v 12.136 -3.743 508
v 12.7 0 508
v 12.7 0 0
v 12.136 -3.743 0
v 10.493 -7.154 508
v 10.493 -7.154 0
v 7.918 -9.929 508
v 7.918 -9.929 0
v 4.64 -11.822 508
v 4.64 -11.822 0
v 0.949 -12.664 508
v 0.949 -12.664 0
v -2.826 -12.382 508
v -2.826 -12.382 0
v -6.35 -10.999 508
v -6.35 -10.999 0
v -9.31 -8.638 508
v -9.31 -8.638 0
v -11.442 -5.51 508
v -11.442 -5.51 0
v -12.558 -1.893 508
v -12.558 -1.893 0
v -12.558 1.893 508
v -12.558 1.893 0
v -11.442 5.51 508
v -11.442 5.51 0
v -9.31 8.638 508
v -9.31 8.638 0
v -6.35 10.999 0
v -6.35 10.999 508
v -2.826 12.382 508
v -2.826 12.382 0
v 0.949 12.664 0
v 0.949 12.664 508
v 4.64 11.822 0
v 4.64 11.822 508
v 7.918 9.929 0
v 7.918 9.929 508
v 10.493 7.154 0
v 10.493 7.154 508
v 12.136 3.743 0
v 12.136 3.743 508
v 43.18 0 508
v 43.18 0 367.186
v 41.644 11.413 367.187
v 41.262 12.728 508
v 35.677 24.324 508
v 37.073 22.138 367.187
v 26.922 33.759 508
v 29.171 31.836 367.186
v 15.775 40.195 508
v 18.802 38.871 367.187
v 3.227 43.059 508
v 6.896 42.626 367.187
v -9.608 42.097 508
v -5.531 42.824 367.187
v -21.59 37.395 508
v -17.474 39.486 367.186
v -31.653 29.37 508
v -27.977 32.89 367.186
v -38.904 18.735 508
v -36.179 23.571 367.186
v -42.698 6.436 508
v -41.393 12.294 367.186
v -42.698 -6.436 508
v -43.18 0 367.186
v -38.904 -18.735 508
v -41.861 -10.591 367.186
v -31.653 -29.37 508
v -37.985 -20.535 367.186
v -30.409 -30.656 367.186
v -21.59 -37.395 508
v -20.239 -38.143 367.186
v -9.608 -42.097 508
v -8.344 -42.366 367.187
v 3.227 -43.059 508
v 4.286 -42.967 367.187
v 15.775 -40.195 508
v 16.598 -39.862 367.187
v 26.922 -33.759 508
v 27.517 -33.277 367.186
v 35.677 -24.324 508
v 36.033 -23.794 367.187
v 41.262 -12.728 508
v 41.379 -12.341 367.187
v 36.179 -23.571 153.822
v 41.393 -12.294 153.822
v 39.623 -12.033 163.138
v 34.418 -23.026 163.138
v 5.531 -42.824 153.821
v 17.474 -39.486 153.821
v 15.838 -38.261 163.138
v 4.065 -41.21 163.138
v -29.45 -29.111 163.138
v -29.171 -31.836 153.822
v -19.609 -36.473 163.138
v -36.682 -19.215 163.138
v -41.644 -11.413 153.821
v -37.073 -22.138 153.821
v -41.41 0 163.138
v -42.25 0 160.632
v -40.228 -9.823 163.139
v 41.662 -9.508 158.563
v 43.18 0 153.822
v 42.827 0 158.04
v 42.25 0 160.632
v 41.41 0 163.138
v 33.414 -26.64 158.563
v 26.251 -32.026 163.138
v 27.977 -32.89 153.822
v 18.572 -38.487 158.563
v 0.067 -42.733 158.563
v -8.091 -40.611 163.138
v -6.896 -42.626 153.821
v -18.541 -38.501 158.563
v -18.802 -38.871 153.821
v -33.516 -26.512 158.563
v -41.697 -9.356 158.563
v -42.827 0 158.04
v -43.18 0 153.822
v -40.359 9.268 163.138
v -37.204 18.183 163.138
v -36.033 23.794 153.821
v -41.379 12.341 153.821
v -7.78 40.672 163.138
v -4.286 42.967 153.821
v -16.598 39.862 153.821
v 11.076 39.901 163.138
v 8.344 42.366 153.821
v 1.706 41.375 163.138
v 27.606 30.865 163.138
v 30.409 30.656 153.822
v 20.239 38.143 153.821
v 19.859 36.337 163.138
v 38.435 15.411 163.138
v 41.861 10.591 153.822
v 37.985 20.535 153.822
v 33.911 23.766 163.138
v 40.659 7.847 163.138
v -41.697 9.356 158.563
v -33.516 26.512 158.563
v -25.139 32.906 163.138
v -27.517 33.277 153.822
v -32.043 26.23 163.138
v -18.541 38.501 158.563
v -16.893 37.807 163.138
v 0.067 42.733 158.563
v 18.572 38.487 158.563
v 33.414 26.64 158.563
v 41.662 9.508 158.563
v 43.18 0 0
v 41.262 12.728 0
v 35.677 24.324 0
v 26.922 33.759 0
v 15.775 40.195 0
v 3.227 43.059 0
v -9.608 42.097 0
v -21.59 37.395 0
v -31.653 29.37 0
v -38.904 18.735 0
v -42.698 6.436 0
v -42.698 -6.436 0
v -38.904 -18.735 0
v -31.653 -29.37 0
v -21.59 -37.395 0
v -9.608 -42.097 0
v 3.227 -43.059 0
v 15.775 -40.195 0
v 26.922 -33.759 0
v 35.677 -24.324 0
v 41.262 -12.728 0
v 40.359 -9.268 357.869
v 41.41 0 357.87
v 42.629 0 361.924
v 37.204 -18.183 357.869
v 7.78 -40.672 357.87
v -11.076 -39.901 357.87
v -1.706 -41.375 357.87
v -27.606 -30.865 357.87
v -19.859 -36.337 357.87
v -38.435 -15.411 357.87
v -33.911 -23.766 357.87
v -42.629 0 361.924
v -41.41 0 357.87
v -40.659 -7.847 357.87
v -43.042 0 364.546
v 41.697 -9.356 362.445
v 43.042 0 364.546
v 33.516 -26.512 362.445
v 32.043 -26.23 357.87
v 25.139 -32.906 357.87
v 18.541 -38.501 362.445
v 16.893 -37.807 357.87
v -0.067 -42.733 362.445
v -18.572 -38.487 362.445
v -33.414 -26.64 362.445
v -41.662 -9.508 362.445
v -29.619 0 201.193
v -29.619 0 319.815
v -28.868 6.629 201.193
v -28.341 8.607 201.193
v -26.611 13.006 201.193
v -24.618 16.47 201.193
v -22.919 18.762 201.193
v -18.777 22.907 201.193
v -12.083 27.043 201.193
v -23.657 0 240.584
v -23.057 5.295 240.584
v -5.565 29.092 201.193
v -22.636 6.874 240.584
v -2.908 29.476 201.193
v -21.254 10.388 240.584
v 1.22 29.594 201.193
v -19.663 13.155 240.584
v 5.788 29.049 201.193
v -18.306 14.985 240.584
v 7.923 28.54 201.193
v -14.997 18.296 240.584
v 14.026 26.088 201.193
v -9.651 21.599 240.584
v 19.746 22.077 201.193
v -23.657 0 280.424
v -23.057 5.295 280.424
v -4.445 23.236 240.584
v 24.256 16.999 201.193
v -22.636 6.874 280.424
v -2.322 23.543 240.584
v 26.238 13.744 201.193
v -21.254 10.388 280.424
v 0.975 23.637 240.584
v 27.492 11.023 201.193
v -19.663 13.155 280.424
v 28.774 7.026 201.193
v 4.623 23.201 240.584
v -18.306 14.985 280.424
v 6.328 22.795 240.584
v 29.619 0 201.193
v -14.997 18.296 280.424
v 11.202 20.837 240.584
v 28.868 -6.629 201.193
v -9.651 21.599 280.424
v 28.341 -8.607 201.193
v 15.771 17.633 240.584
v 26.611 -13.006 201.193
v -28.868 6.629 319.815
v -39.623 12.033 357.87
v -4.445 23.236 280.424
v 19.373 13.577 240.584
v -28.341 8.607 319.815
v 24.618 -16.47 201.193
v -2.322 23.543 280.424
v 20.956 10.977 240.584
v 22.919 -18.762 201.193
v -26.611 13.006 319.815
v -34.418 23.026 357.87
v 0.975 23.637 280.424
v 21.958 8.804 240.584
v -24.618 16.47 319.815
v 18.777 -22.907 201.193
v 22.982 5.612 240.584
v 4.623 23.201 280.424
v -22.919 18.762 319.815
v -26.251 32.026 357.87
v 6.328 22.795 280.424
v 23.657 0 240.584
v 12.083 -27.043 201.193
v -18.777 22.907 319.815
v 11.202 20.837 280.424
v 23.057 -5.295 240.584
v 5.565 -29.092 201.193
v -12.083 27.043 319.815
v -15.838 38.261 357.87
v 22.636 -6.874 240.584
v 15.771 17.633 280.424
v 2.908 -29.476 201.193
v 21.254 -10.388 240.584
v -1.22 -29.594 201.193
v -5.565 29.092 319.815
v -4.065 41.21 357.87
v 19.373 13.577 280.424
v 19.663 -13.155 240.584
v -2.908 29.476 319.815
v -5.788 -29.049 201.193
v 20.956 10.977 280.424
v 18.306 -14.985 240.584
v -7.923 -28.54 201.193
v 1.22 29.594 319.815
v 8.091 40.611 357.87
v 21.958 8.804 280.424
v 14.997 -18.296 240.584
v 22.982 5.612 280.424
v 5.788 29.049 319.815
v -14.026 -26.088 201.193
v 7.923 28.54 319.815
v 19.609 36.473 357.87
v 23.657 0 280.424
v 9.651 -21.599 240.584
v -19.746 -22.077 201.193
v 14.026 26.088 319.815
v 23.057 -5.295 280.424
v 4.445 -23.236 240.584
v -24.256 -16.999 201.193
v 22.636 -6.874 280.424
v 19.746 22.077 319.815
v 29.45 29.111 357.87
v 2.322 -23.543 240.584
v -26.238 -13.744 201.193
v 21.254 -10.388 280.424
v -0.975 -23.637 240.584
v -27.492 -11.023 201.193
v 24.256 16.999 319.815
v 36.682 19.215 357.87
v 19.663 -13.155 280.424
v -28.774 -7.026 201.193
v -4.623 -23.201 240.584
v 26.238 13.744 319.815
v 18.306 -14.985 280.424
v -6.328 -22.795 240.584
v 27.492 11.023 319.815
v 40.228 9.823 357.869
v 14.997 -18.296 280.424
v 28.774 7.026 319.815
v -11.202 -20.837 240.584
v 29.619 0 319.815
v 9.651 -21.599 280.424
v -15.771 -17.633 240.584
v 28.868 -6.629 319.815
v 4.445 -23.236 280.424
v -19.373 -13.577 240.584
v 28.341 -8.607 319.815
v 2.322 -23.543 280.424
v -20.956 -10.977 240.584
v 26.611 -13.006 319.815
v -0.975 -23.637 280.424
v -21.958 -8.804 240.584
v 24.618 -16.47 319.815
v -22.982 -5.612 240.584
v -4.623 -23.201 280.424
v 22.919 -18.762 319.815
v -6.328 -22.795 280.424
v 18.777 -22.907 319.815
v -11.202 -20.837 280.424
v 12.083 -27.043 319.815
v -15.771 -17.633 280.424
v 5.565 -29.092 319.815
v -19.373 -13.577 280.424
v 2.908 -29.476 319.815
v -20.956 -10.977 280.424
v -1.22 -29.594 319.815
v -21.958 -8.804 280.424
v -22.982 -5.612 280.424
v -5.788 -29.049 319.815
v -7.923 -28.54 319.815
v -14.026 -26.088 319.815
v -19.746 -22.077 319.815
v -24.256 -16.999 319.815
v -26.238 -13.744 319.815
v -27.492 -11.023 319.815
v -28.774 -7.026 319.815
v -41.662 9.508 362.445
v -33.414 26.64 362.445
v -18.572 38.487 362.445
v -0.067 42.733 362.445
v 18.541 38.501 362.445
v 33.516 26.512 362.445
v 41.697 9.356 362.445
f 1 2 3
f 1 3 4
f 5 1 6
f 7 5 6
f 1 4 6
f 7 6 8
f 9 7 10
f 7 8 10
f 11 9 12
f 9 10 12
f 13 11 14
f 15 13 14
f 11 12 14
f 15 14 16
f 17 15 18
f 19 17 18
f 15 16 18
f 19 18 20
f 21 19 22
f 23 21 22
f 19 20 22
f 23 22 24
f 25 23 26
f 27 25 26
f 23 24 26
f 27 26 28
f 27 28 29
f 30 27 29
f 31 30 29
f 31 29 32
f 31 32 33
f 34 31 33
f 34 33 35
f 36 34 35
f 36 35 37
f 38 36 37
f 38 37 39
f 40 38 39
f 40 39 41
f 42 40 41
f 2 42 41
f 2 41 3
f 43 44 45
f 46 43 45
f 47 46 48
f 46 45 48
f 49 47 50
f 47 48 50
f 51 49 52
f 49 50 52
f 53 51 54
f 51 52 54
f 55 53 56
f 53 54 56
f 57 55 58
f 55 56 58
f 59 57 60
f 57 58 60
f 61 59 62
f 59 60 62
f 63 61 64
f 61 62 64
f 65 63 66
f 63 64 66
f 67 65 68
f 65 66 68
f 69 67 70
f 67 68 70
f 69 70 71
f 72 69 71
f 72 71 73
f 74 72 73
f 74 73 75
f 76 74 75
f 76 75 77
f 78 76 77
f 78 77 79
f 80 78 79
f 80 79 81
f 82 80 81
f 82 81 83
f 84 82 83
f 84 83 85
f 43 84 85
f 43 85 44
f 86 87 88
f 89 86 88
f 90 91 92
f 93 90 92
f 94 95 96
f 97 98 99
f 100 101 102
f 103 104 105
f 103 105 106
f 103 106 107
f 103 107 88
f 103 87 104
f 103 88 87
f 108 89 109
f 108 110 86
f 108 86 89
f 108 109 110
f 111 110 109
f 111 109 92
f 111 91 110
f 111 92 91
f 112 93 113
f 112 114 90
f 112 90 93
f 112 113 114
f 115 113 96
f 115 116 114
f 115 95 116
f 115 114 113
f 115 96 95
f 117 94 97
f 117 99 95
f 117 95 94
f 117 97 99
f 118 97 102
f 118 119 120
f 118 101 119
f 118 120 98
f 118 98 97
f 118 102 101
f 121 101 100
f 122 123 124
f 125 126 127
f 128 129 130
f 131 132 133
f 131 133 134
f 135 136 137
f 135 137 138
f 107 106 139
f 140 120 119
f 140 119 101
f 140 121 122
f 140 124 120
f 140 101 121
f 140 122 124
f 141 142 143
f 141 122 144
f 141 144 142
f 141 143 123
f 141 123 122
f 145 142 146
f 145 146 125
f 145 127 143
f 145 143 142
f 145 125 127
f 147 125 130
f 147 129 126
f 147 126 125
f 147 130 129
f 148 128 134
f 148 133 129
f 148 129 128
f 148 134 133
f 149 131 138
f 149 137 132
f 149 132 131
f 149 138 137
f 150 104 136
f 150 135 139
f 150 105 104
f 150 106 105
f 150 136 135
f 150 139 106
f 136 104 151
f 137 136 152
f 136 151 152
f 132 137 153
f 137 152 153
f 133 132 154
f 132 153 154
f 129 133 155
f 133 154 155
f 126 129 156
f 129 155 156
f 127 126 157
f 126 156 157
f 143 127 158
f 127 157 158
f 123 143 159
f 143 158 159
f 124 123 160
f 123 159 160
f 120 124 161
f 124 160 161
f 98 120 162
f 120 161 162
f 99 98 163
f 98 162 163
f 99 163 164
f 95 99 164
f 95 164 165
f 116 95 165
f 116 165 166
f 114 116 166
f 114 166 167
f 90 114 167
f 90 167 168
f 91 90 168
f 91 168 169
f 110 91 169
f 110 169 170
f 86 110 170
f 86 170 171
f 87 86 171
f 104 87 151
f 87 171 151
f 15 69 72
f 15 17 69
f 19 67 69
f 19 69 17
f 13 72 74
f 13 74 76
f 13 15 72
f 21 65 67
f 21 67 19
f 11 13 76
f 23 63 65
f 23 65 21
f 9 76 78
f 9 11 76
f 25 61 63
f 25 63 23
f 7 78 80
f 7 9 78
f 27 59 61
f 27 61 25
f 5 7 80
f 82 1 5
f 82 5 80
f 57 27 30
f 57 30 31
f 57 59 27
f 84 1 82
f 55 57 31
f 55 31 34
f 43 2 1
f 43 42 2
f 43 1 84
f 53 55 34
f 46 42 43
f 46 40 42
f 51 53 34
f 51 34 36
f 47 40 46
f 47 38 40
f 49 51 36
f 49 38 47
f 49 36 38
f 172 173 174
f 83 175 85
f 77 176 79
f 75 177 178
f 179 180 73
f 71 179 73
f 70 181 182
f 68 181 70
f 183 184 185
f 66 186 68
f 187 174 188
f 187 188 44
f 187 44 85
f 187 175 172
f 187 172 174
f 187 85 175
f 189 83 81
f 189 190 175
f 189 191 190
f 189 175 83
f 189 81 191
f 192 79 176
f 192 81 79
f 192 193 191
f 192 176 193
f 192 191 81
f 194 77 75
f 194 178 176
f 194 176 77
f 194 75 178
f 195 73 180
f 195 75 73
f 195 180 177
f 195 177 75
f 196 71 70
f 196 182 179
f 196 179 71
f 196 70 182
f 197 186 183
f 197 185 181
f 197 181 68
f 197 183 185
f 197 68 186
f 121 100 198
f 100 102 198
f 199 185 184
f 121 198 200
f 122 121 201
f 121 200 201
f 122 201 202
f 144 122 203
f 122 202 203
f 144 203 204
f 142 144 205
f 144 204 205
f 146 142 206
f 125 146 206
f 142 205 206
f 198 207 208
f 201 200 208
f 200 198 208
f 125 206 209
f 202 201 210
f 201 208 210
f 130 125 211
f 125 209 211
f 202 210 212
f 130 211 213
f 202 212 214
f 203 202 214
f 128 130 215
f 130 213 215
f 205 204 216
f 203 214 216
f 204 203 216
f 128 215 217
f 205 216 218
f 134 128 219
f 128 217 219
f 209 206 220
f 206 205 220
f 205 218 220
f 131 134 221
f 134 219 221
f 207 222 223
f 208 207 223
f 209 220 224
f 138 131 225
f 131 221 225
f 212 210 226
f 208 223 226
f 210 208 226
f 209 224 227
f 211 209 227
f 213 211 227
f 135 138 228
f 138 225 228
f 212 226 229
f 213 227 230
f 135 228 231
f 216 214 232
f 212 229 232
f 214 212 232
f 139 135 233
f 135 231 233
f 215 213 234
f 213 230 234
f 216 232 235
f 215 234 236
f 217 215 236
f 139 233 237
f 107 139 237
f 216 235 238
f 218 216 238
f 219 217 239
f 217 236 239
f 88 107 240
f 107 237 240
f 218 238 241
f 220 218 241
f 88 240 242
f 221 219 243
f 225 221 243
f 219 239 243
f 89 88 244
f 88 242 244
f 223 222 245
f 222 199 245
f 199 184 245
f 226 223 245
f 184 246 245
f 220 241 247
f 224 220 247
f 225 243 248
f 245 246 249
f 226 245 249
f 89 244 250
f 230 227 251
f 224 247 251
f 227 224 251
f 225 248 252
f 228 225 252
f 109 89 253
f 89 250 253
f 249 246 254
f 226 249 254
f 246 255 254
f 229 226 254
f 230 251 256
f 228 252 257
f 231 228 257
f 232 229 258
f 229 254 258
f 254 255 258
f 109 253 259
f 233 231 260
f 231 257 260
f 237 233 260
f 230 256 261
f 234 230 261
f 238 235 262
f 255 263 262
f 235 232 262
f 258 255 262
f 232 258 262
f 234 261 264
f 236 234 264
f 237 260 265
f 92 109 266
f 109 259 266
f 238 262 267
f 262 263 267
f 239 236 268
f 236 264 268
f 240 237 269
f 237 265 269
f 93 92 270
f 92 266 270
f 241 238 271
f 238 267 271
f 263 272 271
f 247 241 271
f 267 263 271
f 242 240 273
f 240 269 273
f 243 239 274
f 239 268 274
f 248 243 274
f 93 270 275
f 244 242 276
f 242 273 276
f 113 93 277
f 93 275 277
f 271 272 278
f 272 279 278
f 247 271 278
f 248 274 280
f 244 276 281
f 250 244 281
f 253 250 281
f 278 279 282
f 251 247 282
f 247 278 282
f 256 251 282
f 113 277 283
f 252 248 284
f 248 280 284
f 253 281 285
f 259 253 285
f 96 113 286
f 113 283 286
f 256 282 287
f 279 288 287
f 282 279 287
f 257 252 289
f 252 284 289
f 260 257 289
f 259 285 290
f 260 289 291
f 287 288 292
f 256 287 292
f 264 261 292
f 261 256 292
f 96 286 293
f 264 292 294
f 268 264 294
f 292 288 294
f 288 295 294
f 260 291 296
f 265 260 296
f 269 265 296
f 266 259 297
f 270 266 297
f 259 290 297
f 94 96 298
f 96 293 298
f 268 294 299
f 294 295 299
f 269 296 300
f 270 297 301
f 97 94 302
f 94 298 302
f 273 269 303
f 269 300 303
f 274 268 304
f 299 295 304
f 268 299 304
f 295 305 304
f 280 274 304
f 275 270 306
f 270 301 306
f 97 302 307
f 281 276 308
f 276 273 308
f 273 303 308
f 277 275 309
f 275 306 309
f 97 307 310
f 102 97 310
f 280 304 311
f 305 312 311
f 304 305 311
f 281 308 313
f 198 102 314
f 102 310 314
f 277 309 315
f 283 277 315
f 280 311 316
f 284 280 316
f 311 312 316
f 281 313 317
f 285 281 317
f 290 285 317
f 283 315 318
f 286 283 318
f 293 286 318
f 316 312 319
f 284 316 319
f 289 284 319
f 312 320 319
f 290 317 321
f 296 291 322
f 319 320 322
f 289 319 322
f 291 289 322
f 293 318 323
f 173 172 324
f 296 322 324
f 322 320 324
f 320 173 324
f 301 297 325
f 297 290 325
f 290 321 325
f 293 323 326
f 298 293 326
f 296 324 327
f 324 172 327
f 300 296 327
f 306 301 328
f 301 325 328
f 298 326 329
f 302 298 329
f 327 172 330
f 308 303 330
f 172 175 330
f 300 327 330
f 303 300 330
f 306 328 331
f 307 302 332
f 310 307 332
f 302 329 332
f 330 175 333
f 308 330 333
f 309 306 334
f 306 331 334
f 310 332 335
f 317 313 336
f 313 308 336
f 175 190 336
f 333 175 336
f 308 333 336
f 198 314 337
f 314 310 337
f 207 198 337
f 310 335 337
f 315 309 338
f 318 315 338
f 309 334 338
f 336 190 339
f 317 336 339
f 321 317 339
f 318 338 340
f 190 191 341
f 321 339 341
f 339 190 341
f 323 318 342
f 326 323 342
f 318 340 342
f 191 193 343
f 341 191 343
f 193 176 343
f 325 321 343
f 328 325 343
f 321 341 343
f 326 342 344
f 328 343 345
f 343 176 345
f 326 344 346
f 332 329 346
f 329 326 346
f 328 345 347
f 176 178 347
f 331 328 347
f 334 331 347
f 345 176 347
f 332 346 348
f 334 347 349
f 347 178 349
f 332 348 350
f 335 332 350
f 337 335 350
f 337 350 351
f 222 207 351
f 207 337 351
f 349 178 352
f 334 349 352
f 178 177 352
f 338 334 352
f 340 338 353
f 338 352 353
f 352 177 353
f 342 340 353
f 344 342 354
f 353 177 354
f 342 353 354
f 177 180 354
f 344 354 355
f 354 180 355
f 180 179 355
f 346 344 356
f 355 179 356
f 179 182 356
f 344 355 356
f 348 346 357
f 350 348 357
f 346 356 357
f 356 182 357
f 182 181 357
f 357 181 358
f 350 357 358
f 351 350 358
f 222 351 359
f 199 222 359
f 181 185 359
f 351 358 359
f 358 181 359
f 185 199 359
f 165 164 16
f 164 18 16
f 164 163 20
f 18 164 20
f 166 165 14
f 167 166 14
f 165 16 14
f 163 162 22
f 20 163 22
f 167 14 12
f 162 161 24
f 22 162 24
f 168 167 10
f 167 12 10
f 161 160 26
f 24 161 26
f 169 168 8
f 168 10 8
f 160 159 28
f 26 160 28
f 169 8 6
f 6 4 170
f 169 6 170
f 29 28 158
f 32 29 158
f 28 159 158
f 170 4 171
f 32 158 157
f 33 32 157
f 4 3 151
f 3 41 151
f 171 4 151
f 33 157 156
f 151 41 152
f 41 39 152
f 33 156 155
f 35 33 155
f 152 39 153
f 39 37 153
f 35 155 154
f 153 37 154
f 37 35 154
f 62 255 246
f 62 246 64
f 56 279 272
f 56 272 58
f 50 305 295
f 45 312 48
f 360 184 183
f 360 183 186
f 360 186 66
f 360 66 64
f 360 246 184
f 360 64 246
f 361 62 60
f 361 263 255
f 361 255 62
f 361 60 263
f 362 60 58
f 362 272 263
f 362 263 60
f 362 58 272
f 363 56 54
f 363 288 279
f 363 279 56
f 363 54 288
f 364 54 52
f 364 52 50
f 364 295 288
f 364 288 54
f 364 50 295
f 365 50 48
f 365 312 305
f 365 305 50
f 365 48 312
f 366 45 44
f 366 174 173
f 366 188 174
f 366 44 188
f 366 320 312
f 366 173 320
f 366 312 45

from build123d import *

# Parameters (mm, degrees)
F0_R     = 43.18
F1_DEPTH = 508
F4_R     = 25.4
F5_R     = 12.7
F6_DEPTH = 508.001


with BuildPart() as f1:
    # F0 (on Top) → F1 (new body)
    with BuildSketch(Plane.XY):
        Circle(F0_R)
    extrude(amount=F1_DEPTH)

    # F2 (on Front) → F3 (revolve, cut)
    with BuildSketch(Plane.XZ):
        with BuildLine():
            Line((-384.330451, 258.428335), (-98.216951, 75.272329))
            ThreePointArc((-98.216951, 75.272329), (-22.933279, 256.891851), (-93.24689, 440.492717))
            Line((-93.24689, 440.492717), (-384.330451, 258.428335))
        make_face()
    revolve(axis=Axis((0, 0, 0), (0, 0, -1)), mode=Mode.SUBTRACT)

    # F4
    f4_edges = [f1.edges().sort_by_distance(p)[0] for p in [
        (0, -43.18, 158.762324),
        (0, 43.18, 158.762324),
        (-22.908703, 0, 260.503948),
        (0, 43.18, 362.245572),
        (0, -43.18, 362.245572),
    ]]
    fillet(f4_edges, radius=F4_R)

    # F5 (on face) → F6 (cut, through all)
    with BuildSketch(Plane(origin=(0, 0, 0), x_dir=(1, 0, 0), z_dir=(0, 0, -1))):
        Circle(F5_R)
    extrude(amount=-F6_DEPTH, mode=Mode.SUBTRACT)


solid = f1.part
